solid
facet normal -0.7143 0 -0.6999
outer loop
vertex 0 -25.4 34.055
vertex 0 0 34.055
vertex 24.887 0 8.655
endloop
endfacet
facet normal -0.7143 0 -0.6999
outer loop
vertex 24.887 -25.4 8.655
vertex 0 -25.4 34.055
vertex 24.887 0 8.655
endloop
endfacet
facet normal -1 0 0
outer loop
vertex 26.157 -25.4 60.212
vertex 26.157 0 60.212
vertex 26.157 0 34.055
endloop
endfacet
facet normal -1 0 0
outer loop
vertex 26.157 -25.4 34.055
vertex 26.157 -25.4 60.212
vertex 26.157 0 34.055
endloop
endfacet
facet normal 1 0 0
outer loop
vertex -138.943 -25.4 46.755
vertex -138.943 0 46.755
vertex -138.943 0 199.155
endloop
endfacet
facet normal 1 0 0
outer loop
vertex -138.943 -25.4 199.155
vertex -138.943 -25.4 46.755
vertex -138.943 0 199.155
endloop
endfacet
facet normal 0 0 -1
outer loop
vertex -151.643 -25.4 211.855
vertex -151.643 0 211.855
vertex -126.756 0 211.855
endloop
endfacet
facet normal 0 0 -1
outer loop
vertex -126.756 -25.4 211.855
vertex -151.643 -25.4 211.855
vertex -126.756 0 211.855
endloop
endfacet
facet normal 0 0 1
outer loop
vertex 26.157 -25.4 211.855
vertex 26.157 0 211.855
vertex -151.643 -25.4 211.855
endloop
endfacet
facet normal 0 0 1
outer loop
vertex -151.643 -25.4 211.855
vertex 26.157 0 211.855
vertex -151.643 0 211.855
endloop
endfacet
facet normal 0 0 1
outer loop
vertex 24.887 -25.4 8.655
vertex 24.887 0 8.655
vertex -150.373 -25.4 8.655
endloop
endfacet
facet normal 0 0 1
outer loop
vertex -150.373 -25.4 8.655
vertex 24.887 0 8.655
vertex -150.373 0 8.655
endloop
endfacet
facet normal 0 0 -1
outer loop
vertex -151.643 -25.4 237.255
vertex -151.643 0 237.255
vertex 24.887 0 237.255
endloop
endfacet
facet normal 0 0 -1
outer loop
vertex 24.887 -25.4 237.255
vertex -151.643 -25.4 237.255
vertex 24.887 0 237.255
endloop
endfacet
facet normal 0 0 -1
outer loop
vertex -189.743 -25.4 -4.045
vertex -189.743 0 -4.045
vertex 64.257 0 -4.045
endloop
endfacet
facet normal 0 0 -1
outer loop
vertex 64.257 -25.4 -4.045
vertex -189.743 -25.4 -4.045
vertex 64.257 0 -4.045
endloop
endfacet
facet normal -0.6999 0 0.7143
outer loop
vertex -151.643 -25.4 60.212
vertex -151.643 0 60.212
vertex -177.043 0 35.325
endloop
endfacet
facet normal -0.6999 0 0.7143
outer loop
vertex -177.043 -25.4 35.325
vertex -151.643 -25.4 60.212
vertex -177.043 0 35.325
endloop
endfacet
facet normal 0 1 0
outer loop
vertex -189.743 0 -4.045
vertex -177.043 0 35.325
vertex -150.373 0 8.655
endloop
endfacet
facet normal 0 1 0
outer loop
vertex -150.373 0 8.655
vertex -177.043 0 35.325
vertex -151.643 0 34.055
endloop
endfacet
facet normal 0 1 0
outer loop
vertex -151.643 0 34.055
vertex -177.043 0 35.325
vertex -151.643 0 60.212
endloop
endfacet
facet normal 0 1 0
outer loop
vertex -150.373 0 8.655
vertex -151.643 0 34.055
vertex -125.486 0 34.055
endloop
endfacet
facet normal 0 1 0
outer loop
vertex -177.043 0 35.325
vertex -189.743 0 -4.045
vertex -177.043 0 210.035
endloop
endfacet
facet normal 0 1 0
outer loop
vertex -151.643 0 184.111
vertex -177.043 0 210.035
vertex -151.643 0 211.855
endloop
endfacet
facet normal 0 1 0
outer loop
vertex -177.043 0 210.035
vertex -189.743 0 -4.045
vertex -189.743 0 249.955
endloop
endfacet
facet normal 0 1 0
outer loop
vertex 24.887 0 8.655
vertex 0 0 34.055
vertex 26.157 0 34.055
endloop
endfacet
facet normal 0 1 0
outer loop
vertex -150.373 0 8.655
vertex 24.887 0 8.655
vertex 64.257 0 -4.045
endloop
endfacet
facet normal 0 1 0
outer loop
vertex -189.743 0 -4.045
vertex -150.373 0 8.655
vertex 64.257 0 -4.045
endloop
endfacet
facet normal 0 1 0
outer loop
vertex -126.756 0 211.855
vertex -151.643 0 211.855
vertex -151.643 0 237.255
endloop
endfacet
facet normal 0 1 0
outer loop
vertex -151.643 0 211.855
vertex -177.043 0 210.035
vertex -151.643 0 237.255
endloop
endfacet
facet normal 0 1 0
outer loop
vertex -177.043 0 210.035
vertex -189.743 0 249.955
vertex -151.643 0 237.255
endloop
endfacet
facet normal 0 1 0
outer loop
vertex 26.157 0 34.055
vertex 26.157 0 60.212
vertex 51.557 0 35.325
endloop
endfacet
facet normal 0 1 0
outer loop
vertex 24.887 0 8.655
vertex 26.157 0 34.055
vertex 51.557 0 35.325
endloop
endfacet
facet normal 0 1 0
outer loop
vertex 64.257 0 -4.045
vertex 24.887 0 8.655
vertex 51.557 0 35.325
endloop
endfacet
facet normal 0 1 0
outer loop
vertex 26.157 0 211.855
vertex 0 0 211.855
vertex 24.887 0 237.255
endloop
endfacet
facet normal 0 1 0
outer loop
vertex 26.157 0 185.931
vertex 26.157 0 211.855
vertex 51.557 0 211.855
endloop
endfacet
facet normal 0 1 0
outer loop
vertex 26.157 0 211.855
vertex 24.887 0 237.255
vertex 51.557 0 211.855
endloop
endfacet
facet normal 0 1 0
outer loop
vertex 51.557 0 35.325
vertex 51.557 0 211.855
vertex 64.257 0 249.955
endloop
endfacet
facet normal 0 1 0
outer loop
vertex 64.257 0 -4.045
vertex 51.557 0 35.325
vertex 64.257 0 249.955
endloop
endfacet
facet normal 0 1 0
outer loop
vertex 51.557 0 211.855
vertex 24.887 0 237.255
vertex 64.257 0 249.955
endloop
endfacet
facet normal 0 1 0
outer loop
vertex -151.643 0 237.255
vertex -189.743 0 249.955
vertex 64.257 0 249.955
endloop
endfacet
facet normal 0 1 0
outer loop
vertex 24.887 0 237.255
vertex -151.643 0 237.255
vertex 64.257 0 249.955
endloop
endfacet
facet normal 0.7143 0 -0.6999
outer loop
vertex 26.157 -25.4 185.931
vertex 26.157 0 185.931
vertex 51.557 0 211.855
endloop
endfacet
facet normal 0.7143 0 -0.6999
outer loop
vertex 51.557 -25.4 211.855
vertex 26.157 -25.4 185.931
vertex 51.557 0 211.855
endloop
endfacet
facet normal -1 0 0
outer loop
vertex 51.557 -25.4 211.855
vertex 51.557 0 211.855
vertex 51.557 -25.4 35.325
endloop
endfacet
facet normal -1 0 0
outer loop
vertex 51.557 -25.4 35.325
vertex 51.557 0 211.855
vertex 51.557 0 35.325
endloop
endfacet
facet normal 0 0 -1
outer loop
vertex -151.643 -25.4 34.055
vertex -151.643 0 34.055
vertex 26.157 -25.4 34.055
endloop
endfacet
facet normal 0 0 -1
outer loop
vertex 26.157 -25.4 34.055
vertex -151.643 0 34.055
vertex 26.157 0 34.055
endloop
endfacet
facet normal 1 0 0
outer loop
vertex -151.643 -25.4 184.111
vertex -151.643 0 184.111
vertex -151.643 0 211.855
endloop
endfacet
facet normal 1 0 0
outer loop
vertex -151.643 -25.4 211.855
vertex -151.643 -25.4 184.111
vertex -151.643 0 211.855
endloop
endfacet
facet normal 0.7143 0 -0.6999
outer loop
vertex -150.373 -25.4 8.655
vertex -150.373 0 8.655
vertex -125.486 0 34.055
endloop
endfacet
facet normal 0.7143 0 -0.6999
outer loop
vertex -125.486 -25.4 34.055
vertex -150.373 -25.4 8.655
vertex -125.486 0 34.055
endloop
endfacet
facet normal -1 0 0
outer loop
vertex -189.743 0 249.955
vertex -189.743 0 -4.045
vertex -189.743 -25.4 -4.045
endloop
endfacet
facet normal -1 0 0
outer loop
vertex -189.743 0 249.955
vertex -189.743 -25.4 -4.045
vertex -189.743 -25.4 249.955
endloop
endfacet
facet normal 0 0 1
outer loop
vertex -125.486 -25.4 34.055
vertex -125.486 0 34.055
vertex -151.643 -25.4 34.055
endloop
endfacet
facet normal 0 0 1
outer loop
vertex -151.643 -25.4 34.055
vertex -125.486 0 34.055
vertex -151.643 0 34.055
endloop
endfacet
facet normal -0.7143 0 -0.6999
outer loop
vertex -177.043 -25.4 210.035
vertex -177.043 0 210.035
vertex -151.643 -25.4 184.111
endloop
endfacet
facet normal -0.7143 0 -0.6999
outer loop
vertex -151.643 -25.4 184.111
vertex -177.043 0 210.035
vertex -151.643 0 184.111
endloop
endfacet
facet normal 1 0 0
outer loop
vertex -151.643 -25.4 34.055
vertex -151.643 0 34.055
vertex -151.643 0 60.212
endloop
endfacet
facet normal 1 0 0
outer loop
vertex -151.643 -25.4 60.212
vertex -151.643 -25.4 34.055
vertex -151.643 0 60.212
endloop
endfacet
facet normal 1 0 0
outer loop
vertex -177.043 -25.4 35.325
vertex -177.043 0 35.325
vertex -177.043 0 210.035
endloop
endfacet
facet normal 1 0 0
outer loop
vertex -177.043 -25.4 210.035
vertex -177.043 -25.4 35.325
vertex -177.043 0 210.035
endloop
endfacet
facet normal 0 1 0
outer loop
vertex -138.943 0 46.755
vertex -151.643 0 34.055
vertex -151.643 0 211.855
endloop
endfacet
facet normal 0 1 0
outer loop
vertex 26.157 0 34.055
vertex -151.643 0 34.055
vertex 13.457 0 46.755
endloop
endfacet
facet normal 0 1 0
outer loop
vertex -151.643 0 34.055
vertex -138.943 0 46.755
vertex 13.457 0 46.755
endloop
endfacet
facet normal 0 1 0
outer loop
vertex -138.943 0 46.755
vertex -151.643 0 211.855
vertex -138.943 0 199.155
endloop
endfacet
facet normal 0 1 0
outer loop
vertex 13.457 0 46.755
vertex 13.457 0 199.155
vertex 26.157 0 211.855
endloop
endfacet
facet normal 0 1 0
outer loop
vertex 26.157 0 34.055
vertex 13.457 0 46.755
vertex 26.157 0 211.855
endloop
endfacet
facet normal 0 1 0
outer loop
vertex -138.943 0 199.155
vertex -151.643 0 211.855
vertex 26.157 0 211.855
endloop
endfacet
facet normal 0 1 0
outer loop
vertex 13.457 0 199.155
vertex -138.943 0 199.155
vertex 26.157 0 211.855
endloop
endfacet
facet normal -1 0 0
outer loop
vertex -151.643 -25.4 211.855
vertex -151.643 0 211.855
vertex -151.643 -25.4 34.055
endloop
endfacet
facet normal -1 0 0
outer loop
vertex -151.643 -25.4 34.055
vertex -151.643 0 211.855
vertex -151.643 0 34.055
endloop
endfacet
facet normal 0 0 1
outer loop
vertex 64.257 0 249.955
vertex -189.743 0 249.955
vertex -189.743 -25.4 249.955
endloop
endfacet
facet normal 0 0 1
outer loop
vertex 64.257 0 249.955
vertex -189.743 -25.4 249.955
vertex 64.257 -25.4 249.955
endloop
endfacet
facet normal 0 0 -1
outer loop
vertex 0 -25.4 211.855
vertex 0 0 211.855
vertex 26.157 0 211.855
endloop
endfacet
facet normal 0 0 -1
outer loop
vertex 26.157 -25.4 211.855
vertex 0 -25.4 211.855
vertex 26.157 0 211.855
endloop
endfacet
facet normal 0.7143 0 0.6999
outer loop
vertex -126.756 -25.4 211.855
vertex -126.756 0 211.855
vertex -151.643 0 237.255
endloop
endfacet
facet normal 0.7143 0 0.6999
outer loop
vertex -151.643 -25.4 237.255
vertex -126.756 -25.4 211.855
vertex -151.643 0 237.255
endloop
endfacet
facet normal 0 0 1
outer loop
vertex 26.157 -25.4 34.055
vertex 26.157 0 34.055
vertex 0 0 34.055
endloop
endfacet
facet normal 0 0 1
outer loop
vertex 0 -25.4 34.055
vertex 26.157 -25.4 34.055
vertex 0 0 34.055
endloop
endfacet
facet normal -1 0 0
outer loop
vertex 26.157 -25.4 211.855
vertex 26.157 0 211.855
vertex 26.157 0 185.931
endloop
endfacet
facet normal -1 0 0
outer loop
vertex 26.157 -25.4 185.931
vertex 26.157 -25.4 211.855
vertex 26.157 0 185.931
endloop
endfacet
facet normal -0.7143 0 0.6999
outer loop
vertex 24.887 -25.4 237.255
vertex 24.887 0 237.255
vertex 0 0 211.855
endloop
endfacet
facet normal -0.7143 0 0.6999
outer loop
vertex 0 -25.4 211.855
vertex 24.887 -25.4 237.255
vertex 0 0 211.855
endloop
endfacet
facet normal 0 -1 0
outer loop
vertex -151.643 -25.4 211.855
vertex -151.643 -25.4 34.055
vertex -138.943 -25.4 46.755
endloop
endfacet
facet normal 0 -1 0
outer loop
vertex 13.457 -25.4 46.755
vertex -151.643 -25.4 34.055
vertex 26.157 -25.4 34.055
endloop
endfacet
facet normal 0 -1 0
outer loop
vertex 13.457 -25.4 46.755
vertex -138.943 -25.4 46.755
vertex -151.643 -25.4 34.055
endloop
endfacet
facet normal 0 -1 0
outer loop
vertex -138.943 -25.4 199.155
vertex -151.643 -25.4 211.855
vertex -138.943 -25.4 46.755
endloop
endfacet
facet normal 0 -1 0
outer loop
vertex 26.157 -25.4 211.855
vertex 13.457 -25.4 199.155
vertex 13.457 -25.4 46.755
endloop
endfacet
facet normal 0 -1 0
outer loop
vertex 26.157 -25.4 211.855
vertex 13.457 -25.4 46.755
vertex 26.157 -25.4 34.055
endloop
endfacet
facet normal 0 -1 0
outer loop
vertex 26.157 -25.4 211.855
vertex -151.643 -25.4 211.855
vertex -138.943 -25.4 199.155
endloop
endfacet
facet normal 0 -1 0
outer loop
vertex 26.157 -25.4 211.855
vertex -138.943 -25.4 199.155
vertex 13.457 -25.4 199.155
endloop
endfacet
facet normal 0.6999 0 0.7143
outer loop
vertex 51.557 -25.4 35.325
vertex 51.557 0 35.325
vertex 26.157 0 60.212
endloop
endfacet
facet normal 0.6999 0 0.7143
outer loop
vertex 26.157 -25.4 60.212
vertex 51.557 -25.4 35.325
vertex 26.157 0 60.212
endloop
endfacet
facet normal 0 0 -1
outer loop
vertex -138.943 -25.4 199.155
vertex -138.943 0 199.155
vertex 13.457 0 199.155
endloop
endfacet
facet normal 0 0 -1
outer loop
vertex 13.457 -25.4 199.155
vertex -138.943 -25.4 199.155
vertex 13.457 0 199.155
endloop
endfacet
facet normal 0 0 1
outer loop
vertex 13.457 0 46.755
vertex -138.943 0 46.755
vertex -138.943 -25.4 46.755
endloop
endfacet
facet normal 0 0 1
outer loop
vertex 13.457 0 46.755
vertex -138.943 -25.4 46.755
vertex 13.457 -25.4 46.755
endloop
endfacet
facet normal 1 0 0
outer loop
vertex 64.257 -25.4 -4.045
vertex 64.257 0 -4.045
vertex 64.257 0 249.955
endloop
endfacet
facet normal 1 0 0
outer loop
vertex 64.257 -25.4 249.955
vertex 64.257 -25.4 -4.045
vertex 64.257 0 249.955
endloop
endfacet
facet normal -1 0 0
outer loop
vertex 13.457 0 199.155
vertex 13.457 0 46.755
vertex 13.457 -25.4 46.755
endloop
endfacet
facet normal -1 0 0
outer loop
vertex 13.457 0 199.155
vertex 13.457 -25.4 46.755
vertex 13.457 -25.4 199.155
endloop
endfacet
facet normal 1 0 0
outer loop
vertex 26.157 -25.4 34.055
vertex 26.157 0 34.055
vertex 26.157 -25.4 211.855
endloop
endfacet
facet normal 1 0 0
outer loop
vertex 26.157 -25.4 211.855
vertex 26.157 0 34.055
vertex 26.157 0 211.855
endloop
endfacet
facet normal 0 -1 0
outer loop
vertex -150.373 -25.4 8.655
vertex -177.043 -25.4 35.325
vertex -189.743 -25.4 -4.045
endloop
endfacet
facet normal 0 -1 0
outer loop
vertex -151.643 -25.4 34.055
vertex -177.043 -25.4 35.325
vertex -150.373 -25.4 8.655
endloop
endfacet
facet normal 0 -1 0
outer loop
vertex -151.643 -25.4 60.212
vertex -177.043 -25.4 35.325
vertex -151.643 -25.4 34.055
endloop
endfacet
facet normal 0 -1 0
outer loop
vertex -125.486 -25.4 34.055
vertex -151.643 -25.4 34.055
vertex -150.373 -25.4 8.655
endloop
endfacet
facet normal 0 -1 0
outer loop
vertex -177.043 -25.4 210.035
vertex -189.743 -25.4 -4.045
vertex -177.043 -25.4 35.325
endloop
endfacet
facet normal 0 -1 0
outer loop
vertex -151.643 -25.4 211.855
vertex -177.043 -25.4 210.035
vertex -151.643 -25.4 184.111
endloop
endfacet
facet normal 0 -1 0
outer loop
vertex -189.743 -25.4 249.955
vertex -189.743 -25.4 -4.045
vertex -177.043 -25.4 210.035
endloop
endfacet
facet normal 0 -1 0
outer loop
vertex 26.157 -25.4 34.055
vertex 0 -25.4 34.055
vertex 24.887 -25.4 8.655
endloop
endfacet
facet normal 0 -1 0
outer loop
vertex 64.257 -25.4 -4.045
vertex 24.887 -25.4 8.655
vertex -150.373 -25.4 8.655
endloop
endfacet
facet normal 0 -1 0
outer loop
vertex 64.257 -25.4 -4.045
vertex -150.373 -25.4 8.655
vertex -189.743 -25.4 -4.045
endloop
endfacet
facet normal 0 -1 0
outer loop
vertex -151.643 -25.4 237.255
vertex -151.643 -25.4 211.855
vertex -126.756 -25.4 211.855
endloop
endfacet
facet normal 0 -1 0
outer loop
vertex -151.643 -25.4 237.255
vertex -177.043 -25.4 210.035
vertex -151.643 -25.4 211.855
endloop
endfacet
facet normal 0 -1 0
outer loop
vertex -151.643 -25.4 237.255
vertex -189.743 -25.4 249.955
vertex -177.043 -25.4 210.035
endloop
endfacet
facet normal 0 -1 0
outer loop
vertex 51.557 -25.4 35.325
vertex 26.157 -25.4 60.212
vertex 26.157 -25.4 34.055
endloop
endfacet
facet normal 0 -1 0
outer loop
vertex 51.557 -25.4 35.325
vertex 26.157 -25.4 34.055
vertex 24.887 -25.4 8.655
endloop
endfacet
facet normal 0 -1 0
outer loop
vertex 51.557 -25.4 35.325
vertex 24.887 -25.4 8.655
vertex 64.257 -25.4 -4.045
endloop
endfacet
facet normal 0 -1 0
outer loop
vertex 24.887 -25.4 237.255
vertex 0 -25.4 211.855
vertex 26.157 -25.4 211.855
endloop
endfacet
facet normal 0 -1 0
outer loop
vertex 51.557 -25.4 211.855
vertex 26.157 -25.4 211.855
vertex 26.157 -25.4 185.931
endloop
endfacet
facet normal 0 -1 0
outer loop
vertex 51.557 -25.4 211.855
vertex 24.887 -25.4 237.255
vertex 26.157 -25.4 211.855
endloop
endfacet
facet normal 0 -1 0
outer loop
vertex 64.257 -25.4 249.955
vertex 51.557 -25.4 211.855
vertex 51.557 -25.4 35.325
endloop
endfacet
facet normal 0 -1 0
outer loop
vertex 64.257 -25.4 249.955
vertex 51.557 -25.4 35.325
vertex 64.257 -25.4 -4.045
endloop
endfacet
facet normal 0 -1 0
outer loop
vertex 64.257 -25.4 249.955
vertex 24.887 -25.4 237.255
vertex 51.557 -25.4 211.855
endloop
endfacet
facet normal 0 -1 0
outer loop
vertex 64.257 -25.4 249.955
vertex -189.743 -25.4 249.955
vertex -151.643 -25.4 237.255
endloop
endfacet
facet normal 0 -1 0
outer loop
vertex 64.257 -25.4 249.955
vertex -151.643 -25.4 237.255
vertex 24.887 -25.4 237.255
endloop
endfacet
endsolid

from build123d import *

# Parameters (mm, degrees)
F1_W     = 152.4
F1_H     = 152.4
F2_DEPTH = 25.4
F0_W     = 254
F0_H     = 254


with BuildPart() as f2:
    # F1 (on face) → F2 (new body)
    with BuildSketch(Plane.XZ):
        Polygon((26.1568157867, 211.8548386488), (0, 211.8548386488), (-126.7563684266, 211.8548386488), (-151.6431842133, 211.8548386488), (-151.6431842133, 184.1111174377), (-151.6431842133, 60.2116544355), (-151.6431842133, 34.0548386488), (-125.4863684266, 34.0548386488), (0, 34.0548386488), (26.1568157867, 34.0548386488), (26.1568157867, 60.2116544355), (26.1568157867, 185.9310722044), align=None)
        with Locations((-62.7431842133, 122.9548386488)):
            Rectangle(F1_W, F1_H, mode=Mode.SUBTRACT)
    extrude(amount=F2_DEPTH)


with BuildPart() as f2b:
    # F0 (on Front) → F2, piece 2 (new body)
    with BuildSketch(Plane.XZ):
        with Locations((-62.7431842133, 122.9548386488)):
            Rectangle(F0_W, F0_H)
        Polygon((-177.0431842133, 210.0348838822), (-177.0431842133, 237.2548386488), (-151.6431842133, 237.2548386488), (24.8868157867, 237.2548386488), (51.5568157867, 237.2548386488), (51.5568157867, 211.8548386488), (51.5568157867, 35.3248386488), (51.5568157867, 8.6548386488), (24.8868157867, 8.6548386488), (-150.3731842133, 8.6548386488), (-177.0431842133, 8.6548386488), (-177.0431842133, 35.3248386488), align=None, mode=Mode.SUBTRACT)
        Polygon((-151.6431842133, 237.2548386488), (-177.0431842133, 237.2548386488), (-177.0431842133, 210.0348838822), (-151.6431842133, 184.1111174377), (-151.6431842133, 211.8548386488), (-126.7563684266, 211.8548386488), align=None)
        Polygon((51.5568157867, 237.2548386488), (24.8868157867, 237.2548386488), (0, 211.8548386488), (26.1568157867, 211.8548386488), (26.1568157867, 185.9310722044), (51.5568157867, 211.8548386488), align=None)
        Polygon((51.5568157867, 8.6548386488), (51.5568157867, 35.3248386488), (26.1568157867, 60.2116544355), (26.1568157867, 34.0548386488), (0, 34.0548386488), (24.8868157867, 8.6548386488), align=None)
        Polygon((-151.6431842133, 60.2116544355), (-177.0431842133, 35.3248386488), (-177.0431842133, 8.6548386488), (-150.3731842133, 8.6548386488), (-125.4863684266, 34.0548386488), (-151.6431842133, 34.0548386488), align=None)
    extrude(amount=F2_DEPTH)


solid = Compound([f2.part, f2b.part])
